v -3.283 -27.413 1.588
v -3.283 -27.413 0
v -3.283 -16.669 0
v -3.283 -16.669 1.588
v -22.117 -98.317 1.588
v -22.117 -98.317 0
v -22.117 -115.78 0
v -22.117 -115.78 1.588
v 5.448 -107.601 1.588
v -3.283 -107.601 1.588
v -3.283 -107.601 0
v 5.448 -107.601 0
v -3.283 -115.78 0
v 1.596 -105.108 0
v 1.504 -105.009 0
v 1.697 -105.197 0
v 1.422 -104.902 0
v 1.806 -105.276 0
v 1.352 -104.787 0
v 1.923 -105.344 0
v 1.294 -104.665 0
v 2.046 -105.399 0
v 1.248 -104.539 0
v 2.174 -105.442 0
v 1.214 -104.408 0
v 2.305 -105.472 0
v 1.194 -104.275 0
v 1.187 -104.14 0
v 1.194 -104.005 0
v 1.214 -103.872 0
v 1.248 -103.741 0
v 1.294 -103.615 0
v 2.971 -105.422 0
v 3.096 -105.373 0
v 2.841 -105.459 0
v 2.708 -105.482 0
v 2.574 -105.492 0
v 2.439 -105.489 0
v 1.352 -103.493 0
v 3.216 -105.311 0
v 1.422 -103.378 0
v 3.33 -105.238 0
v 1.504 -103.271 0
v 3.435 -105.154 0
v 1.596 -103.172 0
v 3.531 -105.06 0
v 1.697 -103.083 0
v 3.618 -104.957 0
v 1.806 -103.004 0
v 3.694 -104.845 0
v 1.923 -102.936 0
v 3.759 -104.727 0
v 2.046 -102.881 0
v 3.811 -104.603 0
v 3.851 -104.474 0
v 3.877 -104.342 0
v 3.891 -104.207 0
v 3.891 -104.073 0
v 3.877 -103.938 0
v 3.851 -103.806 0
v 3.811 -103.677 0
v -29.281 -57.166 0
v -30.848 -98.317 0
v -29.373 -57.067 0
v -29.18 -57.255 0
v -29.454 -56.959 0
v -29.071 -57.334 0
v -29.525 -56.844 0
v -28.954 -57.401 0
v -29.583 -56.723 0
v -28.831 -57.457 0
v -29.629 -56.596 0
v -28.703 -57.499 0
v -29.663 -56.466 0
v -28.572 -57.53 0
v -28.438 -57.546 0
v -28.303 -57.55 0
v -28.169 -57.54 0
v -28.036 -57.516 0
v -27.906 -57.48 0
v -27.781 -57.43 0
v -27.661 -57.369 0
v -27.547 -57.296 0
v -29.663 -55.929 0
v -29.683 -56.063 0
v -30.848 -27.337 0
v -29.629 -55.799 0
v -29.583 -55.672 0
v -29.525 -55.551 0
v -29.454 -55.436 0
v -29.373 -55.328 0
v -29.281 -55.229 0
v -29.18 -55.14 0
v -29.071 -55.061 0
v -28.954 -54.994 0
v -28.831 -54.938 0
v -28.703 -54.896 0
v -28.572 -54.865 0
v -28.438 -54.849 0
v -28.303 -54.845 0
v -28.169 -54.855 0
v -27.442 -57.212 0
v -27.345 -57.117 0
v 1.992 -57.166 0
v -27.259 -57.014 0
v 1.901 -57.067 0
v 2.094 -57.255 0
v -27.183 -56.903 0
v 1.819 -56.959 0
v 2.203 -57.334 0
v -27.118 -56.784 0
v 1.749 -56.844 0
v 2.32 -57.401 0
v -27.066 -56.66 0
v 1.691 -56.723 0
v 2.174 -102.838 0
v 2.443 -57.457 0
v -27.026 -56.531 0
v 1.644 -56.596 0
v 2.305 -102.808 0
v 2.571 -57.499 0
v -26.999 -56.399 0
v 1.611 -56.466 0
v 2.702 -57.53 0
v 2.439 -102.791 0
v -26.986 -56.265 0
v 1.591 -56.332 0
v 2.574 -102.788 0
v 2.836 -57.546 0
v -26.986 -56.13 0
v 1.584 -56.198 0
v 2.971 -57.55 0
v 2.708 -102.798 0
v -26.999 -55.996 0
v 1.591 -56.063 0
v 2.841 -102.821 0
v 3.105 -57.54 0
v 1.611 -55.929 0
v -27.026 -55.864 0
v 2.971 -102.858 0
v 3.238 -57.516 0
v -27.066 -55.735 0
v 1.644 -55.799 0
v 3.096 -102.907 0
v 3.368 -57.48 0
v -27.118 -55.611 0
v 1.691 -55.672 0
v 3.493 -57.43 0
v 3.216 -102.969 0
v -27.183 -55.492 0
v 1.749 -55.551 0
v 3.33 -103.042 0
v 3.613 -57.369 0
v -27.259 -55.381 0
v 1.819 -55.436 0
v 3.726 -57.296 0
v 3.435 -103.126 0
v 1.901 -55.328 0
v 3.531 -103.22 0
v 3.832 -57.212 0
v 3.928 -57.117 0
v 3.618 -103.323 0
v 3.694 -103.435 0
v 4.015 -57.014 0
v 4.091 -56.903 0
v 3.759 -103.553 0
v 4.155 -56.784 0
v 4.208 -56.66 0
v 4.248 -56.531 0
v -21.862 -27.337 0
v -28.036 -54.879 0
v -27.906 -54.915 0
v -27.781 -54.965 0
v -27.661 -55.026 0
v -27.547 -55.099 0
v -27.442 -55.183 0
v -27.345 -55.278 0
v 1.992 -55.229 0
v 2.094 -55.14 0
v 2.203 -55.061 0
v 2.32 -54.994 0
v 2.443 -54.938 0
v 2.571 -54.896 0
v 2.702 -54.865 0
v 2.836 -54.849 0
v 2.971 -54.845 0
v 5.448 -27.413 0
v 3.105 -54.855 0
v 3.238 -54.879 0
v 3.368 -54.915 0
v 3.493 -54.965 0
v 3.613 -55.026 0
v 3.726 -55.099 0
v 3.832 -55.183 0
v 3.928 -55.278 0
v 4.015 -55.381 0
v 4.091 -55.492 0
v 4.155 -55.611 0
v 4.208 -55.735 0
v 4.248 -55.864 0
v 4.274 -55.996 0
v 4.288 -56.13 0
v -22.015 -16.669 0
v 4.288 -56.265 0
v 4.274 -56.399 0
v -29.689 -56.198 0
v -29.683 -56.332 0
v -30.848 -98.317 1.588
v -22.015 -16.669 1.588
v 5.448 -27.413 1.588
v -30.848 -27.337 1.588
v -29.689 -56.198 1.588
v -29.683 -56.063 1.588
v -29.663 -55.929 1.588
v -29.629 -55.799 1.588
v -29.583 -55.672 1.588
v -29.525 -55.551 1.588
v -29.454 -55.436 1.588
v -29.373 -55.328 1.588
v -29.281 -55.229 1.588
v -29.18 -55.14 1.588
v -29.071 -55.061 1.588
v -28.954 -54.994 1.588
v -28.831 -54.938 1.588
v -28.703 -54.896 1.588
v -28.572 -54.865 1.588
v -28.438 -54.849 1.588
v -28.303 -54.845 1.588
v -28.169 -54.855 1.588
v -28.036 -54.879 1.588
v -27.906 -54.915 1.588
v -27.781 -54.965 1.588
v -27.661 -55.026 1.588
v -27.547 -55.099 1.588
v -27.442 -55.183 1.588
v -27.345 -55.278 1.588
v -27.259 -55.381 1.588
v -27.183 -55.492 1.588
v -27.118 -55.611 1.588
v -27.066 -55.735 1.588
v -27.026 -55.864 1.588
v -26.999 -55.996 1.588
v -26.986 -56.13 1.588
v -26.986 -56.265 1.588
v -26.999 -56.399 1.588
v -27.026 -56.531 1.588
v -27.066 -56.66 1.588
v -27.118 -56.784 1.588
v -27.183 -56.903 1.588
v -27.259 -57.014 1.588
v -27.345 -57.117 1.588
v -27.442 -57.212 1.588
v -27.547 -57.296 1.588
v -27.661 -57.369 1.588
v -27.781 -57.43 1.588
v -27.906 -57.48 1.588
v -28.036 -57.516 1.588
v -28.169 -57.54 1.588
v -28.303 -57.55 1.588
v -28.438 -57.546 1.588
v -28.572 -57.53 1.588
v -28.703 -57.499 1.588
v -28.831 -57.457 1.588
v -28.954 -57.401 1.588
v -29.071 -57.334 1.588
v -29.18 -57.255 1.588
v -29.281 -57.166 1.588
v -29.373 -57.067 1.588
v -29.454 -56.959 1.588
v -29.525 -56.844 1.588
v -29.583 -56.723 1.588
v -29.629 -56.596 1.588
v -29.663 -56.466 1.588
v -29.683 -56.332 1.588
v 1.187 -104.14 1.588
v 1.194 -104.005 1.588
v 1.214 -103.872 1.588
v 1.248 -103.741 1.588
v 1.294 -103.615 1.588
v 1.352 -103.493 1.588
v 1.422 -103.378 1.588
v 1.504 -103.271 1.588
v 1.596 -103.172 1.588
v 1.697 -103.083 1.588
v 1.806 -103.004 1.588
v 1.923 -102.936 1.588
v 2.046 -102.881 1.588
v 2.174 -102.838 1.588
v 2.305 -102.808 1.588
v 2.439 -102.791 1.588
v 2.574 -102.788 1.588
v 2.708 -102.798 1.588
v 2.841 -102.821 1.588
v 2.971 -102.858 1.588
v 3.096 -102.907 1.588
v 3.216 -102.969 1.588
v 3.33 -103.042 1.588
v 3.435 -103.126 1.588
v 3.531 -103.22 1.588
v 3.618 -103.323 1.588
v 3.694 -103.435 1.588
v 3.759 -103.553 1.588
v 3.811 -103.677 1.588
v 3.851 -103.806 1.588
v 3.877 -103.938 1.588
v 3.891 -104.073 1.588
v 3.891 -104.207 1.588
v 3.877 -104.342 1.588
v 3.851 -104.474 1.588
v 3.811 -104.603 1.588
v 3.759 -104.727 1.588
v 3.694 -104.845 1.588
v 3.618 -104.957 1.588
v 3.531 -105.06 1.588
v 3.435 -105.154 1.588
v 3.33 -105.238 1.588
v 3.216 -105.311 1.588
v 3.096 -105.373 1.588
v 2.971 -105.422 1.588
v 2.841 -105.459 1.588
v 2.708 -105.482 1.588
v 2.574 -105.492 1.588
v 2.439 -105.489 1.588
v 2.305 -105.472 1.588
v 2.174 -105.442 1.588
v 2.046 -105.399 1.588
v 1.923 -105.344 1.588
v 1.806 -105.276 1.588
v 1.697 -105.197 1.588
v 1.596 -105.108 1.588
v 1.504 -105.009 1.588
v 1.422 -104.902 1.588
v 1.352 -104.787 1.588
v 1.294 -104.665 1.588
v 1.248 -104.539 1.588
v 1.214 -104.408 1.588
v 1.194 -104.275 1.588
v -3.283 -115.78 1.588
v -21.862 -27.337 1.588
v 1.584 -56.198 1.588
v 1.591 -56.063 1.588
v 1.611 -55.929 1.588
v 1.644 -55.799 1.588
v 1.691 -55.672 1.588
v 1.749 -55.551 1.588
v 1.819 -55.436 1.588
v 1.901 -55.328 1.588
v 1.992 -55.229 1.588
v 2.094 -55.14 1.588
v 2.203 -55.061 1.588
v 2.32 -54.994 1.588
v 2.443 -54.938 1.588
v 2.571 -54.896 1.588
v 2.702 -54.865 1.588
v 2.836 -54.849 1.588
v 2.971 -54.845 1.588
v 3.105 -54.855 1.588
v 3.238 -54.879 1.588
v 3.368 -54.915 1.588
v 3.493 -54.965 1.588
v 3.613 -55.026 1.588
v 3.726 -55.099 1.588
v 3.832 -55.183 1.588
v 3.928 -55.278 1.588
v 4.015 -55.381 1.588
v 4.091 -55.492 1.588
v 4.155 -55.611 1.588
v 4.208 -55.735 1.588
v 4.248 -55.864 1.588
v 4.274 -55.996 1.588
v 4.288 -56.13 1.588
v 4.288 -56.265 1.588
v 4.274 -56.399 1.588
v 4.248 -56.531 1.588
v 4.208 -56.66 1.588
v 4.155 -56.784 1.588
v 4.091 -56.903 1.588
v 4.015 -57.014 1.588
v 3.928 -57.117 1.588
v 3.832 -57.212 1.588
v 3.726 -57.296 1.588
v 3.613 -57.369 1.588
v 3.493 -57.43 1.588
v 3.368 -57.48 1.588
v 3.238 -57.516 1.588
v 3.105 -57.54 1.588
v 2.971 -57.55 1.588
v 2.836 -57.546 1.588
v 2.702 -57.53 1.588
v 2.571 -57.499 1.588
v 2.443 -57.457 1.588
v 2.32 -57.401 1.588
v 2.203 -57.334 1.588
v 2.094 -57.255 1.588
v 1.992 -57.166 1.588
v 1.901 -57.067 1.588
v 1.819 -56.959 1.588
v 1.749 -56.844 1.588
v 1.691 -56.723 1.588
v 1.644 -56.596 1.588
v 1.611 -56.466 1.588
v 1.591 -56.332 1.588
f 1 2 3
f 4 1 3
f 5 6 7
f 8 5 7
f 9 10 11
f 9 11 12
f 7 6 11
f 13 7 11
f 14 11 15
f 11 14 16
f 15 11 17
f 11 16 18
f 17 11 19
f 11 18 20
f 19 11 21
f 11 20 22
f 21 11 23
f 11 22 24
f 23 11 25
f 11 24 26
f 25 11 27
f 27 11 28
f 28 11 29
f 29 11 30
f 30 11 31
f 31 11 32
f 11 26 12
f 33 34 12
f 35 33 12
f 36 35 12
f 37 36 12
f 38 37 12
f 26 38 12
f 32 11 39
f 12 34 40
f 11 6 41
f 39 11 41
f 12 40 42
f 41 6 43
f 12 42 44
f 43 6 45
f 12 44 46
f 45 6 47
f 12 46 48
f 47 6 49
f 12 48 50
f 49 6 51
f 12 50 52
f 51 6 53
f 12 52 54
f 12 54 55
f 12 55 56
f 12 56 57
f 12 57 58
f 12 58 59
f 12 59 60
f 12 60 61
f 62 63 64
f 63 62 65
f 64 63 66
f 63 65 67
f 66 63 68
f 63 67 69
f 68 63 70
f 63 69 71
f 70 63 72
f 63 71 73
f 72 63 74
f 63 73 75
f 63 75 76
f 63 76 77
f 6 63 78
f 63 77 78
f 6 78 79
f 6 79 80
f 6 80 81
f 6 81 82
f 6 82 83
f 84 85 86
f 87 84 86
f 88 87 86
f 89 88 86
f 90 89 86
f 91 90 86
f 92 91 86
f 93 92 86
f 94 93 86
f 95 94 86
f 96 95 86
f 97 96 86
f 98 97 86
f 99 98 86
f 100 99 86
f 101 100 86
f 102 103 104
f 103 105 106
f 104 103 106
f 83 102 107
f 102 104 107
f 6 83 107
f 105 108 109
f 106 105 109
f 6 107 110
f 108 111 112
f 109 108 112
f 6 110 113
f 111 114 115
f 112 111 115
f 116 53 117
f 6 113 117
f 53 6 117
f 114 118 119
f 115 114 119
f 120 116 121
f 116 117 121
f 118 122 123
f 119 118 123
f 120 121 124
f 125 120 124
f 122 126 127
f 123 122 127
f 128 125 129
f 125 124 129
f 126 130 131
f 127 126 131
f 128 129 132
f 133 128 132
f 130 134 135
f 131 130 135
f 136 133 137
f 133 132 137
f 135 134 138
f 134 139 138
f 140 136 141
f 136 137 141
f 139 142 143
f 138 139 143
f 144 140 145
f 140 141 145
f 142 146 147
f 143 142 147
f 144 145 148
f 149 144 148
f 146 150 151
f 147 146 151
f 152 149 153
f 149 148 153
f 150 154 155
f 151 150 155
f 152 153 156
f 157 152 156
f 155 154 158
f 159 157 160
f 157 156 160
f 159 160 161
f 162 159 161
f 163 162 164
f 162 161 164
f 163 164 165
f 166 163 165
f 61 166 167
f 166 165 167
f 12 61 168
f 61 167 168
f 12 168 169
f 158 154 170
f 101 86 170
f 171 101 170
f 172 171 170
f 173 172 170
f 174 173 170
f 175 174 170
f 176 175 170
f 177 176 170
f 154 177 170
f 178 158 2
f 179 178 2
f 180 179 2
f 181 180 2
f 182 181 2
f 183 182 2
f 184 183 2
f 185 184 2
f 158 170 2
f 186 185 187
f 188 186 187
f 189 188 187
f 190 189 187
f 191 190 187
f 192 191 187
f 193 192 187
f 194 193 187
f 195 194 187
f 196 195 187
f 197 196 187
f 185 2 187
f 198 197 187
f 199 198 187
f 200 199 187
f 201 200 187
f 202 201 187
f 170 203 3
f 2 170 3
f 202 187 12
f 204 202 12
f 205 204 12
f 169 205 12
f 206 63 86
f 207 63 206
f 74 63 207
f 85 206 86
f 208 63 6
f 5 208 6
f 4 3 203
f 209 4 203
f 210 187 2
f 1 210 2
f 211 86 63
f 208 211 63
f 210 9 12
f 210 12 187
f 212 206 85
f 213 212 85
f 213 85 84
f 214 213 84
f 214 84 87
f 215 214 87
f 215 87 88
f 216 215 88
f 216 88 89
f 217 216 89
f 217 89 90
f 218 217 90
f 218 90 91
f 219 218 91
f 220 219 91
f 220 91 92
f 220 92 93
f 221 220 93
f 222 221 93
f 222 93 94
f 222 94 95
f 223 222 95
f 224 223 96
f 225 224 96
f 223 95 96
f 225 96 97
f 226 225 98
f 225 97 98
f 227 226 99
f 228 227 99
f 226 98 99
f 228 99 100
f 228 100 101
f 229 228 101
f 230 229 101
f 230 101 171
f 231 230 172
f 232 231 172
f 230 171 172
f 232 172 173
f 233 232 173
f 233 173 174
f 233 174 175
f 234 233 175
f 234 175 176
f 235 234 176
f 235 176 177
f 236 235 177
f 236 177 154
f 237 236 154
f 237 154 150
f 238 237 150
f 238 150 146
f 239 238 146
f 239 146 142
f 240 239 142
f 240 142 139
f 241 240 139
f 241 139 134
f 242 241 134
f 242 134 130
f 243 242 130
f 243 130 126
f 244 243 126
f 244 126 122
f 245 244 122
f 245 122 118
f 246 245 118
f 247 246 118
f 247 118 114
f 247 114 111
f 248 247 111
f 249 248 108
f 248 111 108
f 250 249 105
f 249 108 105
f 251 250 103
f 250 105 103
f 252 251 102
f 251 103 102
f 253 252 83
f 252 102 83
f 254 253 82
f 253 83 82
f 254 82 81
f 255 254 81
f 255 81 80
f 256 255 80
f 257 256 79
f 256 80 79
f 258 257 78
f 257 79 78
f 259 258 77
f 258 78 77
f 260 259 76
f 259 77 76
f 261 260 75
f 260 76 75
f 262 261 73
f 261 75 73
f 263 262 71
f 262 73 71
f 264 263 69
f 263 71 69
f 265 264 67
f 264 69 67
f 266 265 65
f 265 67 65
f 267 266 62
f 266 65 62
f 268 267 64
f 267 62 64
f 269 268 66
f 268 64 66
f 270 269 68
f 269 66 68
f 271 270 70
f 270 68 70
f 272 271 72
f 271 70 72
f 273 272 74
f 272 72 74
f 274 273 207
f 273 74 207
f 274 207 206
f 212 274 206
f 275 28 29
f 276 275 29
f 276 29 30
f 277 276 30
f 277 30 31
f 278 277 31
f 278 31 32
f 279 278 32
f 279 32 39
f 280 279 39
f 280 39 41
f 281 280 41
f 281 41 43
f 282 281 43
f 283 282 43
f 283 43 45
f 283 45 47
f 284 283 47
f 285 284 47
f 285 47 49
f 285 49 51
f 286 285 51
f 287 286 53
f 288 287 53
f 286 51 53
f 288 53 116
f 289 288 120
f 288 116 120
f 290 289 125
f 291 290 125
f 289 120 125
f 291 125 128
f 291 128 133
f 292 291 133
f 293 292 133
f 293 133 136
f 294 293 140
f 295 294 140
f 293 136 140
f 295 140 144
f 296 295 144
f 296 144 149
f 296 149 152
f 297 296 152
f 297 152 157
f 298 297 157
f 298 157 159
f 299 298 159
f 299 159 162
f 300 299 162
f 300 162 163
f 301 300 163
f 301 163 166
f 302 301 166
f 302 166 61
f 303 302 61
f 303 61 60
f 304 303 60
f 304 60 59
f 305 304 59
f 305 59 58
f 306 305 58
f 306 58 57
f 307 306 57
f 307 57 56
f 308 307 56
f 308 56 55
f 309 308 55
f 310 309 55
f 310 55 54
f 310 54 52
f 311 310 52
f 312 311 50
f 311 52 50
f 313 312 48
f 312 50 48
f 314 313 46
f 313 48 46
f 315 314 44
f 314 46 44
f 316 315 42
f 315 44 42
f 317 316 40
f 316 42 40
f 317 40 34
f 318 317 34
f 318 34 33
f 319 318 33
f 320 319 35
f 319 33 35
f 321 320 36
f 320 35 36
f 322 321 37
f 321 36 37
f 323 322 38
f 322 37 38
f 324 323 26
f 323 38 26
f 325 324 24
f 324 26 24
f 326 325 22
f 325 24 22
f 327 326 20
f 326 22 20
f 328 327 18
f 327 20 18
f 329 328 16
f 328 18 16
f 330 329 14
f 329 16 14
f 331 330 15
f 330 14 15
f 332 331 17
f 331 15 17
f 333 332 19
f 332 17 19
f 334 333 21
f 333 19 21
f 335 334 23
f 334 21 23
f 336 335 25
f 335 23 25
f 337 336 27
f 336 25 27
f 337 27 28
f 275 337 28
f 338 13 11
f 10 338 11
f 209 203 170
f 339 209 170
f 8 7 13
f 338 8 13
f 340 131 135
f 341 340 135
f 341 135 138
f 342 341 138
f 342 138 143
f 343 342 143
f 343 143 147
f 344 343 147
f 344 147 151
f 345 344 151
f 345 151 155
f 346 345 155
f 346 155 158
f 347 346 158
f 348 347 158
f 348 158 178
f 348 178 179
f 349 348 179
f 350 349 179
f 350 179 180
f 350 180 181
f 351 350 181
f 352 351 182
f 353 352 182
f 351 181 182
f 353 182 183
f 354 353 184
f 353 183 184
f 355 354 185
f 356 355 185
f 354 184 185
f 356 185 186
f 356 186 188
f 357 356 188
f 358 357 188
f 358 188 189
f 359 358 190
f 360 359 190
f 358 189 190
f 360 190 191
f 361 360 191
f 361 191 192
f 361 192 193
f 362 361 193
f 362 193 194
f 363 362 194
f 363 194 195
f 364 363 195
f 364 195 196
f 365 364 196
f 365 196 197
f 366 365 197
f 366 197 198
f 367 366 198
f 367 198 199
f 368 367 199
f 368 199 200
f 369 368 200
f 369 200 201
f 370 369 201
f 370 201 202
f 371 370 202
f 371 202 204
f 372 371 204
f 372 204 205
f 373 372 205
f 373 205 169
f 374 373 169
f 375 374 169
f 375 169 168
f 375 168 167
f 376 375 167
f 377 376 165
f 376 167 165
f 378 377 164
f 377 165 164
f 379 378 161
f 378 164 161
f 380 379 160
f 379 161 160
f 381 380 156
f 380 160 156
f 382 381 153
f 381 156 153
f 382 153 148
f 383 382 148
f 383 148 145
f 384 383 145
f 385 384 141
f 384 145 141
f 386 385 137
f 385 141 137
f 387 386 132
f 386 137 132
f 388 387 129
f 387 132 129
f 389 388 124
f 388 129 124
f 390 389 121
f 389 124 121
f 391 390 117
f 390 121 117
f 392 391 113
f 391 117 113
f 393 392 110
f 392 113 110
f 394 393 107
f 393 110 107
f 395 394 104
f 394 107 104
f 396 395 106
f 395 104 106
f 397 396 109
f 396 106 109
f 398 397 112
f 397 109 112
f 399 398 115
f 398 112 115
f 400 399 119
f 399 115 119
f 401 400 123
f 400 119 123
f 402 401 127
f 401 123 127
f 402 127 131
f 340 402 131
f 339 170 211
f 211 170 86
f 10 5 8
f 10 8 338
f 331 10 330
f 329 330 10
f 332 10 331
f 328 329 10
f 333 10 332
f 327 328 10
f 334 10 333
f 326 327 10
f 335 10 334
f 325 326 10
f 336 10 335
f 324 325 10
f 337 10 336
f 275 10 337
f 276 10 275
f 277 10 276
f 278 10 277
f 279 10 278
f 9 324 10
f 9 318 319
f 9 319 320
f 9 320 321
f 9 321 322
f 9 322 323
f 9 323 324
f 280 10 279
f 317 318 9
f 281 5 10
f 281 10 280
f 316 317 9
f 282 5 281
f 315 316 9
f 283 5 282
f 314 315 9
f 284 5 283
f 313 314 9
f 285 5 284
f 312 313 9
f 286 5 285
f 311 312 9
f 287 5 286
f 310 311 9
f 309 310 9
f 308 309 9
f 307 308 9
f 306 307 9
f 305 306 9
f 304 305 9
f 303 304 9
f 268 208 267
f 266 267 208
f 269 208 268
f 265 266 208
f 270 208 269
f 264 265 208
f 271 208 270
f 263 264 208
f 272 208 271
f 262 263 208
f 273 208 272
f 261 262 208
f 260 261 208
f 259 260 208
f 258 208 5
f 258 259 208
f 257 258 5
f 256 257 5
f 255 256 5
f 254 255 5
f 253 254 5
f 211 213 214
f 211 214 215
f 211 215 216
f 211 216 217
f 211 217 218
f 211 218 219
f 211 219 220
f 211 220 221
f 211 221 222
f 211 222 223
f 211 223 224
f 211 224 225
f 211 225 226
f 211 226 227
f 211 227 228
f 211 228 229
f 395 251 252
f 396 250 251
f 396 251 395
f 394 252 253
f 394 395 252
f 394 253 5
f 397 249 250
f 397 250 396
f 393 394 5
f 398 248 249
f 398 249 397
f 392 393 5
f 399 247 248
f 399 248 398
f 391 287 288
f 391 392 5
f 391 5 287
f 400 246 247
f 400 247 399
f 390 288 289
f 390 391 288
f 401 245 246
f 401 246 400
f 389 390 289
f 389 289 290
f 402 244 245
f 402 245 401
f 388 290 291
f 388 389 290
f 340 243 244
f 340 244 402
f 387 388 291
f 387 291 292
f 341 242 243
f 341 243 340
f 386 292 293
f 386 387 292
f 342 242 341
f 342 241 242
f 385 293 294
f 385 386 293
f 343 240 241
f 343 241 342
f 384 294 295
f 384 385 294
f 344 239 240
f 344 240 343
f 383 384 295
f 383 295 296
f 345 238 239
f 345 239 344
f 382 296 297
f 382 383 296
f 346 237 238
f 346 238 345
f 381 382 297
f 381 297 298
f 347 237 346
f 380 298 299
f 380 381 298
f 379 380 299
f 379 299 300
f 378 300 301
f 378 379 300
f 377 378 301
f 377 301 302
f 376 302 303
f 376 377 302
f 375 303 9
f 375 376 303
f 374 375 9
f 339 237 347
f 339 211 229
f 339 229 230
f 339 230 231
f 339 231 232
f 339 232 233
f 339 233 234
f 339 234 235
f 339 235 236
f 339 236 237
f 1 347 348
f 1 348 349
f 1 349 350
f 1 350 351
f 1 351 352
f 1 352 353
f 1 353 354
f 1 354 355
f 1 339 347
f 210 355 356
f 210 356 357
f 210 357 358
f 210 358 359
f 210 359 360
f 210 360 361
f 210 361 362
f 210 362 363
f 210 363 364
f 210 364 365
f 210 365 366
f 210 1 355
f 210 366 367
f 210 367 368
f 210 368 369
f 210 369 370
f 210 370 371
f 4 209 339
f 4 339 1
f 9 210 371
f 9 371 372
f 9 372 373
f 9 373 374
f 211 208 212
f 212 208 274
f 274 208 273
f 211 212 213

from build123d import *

# Parameters (mm, degrees)
BOSS_EXTRUDE1_DEPTH   = 1.5875
SKETCH2_W             = 8.73125
SKETCH2_H             = 9.2837
BOSS_EXTRUDE2_DEPTH   = 1.5875
F_2_CLEARANCE_HOLE1_D = 2.7051


with BuildPart() as part:
    # Sketch1 → Boss-Extrude1 (new body)
    with BuildSketch(Plane.XY):
        Polygon((-30.8483, -49.68875), (-30.8483, -98.31705), (-22.11705, -98.31705), (-22.11705, -115.77955), (-3.28295, -115.77955), (-3.28295, -98.31705), (5.4483, -98.31705), (5.4483, -49.68875), (5.4483, -27.41295), (-3.28295, -27.41295), (-3.28295, -16.66875), (-22.014883705, -16.66875), (-21.862168628, -27.33675), (-30.8483, -27.33675), align=None)
    extrude(amount=BOSS_EXTRUDE1_DEPTH)

    # Sketch2 → Boss-Extrude2 (add, through all)
    with BuildSketch(Plane.XY.offset(1.5875)):
        with Locations((1.082675, -102.9589)):
            Rectangle(SKETCH2_W, SKETCH2_H)
    extrude(amount=-BOSS_EXTRUDE2_DEPTH)

    # #2 Clearance Hole1 (through all)
    with Locations(Plane.XY.offset(1.5875)):
        with Locations((2.54, -104.14), (-28.336875, -56.1975), (2.936875, -56.1975)):
            Hole(F_2_CLEARANCE_HOLE1_D / 2)


solid = part.part
